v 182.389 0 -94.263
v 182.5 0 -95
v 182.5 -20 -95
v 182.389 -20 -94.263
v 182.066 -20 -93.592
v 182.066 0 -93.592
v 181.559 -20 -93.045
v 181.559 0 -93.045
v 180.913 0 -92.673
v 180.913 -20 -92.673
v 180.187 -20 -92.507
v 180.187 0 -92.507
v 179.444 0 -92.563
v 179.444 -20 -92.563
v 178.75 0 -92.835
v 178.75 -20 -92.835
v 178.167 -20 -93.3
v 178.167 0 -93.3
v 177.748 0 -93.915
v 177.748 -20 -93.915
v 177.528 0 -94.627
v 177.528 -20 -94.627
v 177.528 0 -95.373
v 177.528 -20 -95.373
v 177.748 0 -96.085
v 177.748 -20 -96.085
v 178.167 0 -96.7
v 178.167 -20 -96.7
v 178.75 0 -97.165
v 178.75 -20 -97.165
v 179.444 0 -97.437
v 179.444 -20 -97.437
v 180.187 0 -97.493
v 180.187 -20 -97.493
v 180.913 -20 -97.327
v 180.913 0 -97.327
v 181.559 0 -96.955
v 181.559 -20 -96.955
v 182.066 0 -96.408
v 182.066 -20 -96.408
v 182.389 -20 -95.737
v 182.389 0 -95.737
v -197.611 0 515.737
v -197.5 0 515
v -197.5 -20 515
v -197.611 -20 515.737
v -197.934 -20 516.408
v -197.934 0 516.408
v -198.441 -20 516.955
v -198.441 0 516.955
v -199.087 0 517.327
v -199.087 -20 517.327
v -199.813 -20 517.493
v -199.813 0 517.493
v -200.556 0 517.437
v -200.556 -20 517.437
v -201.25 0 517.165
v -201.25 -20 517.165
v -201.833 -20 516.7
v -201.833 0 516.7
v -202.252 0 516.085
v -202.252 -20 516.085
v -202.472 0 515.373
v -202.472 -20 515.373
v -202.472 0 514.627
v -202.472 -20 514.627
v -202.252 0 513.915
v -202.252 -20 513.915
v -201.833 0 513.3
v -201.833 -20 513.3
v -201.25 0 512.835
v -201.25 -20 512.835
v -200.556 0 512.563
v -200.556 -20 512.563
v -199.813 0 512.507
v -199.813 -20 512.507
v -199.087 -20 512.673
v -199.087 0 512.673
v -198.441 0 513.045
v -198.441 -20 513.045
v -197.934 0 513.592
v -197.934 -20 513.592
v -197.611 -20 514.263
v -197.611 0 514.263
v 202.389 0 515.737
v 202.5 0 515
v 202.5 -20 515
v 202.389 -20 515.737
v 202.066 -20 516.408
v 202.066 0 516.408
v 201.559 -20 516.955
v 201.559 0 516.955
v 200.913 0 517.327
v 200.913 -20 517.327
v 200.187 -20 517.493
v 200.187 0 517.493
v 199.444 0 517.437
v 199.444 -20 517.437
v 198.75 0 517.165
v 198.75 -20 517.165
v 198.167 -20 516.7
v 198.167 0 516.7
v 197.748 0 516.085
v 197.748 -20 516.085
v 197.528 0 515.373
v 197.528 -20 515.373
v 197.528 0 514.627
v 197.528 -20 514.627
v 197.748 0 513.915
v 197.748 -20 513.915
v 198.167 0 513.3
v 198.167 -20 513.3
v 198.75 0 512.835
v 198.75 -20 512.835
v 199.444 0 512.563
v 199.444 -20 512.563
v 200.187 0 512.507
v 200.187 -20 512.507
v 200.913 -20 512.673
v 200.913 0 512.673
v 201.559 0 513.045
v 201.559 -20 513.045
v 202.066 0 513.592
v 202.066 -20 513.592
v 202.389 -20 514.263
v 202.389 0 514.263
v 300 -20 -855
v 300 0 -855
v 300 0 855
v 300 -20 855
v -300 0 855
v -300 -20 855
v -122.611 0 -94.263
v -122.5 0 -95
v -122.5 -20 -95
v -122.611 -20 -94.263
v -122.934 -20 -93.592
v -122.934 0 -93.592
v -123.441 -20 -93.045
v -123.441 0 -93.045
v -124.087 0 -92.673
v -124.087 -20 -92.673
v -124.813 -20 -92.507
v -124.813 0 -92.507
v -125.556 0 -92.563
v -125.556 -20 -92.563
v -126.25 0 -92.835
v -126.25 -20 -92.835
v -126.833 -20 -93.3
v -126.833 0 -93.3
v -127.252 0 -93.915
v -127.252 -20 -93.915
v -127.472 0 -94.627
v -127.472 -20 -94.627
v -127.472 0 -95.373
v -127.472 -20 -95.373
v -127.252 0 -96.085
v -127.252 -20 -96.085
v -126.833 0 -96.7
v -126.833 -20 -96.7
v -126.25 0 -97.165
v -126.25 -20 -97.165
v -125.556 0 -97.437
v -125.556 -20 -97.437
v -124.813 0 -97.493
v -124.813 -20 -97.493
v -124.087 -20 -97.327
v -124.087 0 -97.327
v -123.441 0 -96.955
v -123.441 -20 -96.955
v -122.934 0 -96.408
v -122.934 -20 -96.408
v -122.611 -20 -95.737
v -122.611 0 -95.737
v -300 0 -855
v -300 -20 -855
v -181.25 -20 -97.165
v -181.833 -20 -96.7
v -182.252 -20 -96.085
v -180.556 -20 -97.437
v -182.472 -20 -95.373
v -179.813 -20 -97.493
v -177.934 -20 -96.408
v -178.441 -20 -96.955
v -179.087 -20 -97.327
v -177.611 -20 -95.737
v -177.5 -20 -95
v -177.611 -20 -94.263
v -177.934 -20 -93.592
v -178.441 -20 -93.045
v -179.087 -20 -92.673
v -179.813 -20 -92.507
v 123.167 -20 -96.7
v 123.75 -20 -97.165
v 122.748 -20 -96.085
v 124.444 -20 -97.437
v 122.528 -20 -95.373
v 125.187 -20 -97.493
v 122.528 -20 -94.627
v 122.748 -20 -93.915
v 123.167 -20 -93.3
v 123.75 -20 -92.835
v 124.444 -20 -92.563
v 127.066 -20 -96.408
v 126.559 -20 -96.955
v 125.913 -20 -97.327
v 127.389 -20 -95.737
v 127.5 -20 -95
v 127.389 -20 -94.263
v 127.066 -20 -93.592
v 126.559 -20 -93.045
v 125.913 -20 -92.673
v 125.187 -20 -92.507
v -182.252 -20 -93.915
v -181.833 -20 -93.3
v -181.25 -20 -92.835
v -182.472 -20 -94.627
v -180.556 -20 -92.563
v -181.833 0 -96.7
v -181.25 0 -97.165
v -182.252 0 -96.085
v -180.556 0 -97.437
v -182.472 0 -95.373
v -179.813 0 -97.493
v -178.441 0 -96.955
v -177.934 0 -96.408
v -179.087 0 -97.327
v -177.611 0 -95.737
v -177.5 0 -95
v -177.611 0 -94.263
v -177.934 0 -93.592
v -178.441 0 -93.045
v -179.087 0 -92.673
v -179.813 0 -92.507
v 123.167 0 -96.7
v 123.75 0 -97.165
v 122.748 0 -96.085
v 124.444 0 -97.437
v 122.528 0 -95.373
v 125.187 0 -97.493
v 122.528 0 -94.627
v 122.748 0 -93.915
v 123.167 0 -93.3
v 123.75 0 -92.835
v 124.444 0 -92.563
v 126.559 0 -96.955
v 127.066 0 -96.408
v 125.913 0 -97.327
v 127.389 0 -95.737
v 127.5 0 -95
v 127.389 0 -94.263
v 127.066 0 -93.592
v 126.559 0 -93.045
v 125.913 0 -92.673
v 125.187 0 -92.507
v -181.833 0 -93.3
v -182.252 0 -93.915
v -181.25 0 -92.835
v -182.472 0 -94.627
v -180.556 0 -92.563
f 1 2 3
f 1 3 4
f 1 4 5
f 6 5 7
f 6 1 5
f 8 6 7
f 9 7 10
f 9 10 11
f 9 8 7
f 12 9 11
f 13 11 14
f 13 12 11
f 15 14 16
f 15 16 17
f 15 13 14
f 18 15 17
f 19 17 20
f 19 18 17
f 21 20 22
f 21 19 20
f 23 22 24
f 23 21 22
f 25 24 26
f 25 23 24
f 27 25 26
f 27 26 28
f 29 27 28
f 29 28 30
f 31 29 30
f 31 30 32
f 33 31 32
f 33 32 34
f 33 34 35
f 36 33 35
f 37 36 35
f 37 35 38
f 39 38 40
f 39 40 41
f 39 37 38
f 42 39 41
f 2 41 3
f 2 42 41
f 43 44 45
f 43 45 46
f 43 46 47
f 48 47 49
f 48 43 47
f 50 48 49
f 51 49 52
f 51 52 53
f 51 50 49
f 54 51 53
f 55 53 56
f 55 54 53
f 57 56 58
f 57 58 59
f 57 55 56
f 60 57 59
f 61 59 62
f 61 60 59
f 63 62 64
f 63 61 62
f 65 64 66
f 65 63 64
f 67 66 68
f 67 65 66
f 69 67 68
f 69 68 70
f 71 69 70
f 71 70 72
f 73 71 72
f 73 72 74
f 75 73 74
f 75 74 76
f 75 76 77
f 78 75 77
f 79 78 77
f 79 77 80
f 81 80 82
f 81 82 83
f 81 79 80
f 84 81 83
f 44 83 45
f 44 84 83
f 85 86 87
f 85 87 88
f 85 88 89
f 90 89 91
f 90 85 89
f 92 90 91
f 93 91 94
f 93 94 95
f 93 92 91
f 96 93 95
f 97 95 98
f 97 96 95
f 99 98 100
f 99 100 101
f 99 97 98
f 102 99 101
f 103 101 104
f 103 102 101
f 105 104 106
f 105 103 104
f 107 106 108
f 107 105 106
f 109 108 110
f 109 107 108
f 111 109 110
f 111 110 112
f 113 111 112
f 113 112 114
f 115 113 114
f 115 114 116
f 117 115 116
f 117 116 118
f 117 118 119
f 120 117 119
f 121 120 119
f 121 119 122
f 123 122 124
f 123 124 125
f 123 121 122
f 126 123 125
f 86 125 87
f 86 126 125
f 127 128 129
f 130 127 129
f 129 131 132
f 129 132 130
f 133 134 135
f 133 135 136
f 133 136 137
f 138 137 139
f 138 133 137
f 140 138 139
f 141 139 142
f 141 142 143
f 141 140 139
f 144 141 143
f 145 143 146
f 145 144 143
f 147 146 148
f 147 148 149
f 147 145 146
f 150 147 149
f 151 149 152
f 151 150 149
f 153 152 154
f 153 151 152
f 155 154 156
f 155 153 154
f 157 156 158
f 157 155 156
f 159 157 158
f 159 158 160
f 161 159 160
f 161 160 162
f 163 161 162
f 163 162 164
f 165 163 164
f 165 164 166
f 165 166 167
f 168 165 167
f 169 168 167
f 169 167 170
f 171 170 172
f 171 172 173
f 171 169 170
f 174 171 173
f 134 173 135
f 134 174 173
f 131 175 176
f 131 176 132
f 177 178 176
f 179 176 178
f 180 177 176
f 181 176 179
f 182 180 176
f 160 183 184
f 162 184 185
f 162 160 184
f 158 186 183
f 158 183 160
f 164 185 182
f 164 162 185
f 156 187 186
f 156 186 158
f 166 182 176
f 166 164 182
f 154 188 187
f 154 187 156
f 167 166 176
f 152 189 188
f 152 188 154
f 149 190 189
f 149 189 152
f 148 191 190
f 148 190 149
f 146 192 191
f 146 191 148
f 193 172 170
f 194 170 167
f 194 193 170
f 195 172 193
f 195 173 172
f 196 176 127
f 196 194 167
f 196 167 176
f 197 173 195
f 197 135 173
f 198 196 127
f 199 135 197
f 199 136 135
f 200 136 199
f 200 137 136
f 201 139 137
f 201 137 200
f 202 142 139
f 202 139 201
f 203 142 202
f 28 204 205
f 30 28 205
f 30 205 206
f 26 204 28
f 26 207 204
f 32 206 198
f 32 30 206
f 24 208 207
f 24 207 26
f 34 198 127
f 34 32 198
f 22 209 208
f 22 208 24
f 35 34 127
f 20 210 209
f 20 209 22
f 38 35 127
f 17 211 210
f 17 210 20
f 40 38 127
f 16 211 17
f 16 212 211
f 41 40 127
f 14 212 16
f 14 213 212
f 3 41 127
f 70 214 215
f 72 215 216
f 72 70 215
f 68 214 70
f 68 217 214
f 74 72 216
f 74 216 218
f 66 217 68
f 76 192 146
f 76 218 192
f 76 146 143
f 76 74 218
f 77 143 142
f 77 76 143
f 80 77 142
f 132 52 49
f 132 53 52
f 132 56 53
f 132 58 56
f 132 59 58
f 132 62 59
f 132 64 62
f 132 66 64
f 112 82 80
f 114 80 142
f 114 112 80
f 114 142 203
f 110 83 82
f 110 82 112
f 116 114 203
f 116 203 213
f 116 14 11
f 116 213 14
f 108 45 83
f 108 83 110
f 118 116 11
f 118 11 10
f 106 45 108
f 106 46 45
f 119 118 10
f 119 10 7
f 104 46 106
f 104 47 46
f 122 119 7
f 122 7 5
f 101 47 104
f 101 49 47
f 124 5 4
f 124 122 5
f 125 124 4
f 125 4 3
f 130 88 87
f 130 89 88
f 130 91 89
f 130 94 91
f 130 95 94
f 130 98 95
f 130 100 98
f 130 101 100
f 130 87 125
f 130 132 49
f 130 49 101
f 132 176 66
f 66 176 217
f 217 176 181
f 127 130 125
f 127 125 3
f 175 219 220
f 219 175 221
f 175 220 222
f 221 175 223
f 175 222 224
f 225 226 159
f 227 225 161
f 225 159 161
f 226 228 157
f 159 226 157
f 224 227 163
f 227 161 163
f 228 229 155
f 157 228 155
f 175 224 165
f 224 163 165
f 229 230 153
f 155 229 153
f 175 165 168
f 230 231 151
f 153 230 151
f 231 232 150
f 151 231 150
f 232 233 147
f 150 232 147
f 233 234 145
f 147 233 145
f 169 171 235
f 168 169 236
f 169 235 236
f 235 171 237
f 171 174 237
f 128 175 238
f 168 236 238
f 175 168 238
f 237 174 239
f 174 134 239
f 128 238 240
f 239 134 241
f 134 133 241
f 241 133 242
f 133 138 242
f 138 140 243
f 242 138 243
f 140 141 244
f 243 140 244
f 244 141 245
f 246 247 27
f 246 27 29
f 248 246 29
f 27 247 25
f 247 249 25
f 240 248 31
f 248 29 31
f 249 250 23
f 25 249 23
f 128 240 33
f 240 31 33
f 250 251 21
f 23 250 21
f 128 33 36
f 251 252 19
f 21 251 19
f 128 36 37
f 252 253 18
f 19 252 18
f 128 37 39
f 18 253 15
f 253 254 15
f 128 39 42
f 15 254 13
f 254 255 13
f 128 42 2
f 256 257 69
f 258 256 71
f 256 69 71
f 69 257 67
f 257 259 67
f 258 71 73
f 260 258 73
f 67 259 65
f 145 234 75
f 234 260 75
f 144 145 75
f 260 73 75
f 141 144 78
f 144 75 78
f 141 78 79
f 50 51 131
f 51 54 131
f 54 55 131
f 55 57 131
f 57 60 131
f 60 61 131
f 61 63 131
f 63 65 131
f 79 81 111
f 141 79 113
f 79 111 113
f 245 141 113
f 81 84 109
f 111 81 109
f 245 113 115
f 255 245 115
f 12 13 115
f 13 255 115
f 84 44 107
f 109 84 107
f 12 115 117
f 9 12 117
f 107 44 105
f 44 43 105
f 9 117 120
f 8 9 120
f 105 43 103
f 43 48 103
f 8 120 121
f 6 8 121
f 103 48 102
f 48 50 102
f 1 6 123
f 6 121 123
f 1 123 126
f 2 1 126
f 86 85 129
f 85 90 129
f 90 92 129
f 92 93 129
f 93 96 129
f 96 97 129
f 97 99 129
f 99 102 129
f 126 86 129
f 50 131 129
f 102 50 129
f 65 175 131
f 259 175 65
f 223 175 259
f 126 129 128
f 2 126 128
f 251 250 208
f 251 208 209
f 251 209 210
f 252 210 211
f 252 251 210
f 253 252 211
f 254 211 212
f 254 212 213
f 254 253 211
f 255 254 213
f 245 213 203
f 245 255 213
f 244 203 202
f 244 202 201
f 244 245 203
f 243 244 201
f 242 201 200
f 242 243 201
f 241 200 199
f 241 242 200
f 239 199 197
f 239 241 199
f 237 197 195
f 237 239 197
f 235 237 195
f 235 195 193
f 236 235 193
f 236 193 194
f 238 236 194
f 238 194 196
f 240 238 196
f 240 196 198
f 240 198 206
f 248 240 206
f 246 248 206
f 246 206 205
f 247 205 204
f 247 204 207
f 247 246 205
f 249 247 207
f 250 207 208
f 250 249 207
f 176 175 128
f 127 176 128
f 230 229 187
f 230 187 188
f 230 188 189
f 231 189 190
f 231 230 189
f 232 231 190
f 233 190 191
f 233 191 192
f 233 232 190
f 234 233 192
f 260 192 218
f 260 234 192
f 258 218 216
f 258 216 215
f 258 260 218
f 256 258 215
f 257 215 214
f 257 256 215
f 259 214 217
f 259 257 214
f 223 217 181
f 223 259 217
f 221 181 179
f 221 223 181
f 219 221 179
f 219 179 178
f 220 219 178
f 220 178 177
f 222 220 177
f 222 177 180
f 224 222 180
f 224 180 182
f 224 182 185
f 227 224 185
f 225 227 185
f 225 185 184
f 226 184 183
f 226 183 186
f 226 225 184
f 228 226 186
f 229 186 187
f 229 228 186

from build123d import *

# Parameters (mm, degrees)
F0_W     = 600
F0_H     = 1710
F0_R     = 2.5
F1_DEPTH = 20


with BuildPart() as f1:
    # F0 (on Front) → F1 (new body)
    with BuildSketch(Plane.XZ):
        Rectangle(F0_W, F0_H)
        with Locations((-180, -95)):
            Circle(F0_R, mode=Mode.SUBTRACT)
        with Locations((-125, -95)):
            Circle(F0_R, mode=Mode.SUBTRACT)
        with Locations((125, -95)):
            Circle(F0_R, mode=Mode.SUBTRACT)
        with Locations((180, -95)):
            Circle(F0_R, mode=Mode.SUBTRACT)
        with Locations((-200, 515)):
            Circle(F0_R, mode=Mode.SUBTRACT)
        with Locations((200, 515)):
            Circle(F0_R, mode=Mode.SUBTRACT)
    extrude(amount=F1_DEPTH)


solid = f1.part
